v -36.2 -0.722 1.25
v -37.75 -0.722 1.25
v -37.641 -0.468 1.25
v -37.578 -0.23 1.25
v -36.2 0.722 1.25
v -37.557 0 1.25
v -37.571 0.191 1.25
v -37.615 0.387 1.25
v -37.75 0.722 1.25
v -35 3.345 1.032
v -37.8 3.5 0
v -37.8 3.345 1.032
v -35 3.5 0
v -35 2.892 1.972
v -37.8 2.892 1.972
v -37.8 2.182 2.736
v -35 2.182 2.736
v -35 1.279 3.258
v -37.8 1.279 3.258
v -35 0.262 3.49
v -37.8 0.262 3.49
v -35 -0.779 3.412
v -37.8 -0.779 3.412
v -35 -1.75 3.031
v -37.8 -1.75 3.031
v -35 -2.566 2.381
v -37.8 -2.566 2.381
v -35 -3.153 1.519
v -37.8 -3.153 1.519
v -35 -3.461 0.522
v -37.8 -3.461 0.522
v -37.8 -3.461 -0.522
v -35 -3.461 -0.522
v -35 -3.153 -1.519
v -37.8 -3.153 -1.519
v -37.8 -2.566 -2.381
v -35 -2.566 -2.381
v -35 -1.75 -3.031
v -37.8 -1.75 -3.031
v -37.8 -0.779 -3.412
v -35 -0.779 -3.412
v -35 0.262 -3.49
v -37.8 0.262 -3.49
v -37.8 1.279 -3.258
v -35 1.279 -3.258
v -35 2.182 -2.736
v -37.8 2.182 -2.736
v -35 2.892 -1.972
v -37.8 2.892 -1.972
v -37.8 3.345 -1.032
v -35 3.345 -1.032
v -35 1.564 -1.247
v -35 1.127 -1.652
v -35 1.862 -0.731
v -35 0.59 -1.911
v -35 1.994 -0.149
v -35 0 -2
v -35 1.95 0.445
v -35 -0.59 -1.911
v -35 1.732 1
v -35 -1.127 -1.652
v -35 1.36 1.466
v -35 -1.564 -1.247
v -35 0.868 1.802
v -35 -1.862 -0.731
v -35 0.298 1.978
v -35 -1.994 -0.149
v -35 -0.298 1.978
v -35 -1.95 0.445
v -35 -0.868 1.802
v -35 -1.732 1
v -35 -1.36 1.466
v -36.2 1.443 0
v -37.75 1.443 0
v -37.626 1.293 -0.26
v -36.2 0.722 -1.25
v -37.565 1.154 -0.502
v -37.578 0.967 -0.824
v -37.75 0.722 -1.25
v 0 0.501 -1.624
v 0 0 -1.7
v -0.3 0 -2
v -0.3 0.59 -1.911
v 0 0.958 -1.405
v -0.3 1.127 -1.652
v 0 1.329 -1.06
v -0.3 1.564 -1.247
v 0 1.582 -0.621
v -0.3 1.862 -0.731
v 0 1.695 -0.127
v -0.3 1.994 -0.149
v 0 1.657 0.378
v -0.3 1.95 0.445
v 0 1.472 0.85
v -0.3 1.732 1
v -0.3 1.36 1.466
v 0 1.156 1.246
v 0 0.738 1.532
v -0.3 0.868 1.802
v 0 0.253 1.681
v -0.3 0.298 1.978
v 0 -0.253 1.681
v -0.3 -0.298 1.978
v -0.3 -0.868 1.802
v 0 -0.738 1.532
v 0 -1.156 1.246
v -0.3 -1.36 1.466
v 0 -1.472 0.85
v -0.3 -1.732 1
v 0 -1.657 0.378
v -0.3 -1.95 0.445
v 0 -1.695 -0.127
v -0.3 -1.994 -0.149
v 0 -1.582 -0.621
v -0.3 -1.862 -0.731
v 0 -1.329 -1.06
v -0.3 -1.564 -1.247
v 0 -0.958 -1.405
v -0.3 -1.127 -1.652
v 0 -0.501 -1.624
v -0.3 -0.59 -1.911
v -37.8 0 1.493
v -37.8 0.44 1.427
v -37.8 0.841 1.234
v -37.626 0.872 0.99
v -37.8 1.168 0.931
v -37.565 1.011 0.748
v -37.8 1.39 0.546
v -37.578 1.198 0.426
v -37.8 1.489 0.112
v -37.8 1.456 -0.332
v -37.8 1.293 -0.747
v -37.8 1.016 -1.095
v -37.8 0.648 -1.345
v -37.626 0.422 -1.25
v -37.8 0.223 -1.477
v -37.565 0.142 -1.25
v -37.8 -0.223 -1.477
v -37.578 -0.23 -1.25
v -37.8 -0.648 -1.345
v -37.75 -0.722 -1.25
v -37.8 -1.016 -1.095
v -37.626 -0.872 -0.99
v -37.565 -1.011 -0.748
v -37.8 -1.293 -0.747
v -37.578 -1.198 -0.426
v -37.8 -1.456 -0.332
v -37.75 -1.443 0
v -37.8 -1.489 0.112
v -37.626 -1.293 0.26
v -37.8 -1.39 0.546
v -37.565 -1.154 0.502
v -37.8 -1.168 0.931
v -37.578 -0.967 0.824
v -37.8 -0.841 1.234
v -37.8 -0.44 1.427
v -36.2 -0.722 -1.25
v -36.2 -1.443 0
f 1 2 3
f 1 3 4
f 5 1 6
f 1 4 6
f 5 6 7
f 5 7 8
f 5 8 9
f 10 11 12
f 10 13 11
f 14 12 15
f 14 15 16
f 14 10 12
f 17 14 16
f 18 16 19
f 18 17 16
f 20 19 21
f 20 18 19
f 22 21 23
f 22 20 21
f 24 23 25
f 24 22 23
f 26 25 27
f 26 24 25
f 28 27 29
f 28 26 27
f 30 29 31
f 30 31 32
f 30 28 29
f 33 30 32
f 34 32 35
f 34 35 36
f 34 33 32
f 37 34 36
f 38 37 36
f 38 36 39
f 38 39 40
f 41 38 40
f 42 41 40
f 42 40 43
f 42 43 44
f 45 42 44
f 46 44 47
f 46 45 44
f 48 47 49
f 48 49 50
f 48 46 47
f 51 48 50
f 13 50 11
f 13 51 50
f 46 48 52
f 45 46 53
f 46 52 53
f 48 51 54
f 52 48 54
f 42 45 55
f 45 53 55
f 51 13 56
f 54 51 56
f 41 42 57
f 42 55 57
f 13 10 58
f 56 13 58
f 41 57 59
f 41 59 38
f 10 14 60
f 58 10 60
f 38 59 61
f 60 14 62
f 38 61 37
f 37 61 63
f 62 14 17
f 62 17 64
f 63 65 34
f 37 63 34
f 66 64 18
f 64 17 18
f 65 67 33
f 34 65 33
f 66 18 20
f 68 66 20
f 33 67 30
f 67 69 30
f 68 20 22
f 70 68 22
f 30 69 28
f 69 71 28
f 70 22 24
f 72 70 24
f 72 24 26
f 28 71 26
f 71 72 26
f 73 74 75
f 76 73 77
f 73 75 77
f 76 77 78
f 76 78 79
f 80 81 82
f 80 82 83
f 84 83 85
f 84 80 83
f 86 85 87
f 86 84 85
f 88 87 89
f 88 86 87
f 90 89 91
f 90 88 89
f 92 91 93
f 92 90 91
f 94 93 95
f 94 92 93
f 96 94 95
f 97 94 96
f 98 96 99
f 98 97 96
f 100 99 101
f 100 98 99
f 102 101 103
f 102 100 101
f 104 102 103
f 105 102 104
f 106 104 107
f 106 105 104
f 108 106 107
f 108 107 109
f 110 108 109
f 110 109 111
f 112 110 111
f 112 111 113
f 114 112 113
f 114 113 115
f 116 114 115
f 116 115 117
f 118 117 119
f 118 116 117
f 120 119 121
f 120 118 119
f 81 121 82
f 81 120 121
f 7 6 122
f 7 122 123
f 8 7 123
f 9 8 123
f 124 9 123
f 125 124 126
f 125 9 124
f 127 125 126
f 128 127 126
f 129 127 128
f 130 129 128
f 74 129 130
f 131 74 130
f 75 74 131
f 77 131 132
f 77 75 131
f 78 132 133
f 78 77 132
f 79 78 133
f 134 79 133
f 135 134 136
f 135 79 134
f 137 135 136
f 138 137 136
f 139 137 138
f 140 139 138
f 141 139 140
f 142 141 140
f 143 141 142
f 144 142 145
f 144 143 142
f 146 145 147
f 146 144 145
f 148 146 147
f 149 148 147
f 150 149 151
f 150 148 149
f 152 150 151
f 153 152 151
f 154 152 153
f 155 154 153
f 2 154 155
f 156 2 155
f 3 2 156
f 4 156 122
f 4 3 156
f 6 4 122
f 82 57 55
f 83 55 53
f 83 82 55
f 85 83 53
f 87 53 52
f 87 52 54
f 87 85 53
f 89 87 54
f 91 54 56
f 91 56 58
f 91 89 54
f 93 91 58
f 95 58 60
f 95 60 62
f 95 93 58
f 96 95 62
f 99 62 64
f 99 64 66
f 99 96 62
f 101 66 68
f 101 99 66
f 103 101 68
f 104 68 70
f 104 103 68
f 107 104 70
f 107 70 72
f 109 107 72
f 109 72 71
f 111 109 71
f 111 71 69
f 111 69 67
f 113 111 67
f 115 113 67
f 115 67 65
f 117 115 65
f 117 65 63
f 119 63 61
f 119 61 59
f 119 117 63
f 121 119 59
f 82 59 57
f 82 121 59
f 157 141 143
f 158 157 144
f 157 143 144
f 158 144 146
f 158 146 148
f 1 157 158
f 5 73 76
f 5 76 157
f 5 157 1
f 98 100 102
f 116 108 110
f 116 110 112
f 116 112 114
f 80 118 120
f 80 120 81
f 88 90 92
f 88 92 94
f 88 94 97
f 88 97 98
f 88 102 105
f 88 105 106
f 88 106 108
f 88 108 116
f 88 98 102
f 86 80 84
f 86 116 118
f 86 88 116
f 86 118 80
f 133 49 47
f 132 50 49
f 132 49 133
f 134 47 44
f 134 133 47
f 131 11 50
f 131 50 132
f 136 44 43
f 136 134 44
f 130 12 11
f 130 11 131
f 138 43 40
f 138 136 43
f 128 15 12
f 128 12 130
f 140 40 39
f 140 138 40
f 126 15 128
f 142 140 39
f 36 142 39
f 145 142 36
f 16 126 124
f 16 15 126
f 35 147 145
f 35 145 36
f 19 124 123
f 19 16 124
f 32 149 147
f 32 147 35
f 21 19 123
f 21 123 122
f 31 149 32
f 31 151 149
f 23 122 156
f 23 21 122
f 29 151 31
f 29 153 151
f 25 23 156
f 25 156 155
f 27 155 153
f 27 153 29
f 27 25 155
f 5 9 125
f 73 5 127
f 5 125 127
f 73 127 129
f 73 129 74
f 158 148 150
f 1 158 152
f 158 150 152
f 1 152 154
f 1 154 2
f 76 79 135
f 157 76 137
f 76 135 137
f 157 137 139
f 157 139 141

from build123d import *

# Parameters (mm, degrees)
SKETCH2_R           = 2
BOSS_EXTRUDE1_DEPTH = 35
CHAMFER1_SIZE       = 0.3
SKETCH6_W           = 2.8
SKETCH6_H           = 3.5
CUT_EXTRUDE1_DEPTH  = 1.6
SKETCH8_R           = 1.493375673
CUT_EXTRUDE2_DEPTH  = 1
CUT_EXTRUDE2_TAPER  = 45


with BuildPart() as part:
    # Sketch2 → Boss-Extrude1 (new body)
    with BuildSketch(Plane(origin=(0, 0, 0), x_dir=(0, 0, -1), z_dir=(1, 0, 0))):
        Circle(SKETCH2_R)
    extrude(amount=-BOSS_EXTRUDE1_DEPTH)

    # Chamfer1
    chamfer1_edges = [part.edges().sort_by_distance(p)[0] for p in [
        (0, 0, 2),
    ]]
    chamfer(chamfer1_edges, length=CHAMFER1_SIZE)

    # Sketch6 → Revolve1 (revolve)
    with BuildSketch(Plane.XY):
        with Locations((-36.4, 1.75)):
            Rectangle(SKETCH6_W, SKETCH6_H)
    revolve(axis=Axis((-35, 0, 0), (1, 0, 0)))

    # Sketch7 → Cut-Extrude1 (cut)
    with BuildSketch(Plane.ZY.offset(37.8)):
        Polygon((0, 1.443375673), (-1.25, 0.721687836), (-1.25, -0.721687836), (0, -1.443375673), (1.25, -0.721687836), (1.25, 0.721687836), align=None)
    extrude(amount=-CUT_EXTRUDE1_DEPTH, mode=Mode.SUBTRACT)

    # Sketch8 → Cut-Extrude2 (cut)
    with BuildSketch(Plane.ZY.offset(37.8)):
        Circle(SKETCH8_R)
    extrude(amount=-CUT_EXTRUDE2_DEPTH, taper=CUT_EXTRUDE2_TAPER, mode=Mode.SUBTRACT)


solid = part.part
